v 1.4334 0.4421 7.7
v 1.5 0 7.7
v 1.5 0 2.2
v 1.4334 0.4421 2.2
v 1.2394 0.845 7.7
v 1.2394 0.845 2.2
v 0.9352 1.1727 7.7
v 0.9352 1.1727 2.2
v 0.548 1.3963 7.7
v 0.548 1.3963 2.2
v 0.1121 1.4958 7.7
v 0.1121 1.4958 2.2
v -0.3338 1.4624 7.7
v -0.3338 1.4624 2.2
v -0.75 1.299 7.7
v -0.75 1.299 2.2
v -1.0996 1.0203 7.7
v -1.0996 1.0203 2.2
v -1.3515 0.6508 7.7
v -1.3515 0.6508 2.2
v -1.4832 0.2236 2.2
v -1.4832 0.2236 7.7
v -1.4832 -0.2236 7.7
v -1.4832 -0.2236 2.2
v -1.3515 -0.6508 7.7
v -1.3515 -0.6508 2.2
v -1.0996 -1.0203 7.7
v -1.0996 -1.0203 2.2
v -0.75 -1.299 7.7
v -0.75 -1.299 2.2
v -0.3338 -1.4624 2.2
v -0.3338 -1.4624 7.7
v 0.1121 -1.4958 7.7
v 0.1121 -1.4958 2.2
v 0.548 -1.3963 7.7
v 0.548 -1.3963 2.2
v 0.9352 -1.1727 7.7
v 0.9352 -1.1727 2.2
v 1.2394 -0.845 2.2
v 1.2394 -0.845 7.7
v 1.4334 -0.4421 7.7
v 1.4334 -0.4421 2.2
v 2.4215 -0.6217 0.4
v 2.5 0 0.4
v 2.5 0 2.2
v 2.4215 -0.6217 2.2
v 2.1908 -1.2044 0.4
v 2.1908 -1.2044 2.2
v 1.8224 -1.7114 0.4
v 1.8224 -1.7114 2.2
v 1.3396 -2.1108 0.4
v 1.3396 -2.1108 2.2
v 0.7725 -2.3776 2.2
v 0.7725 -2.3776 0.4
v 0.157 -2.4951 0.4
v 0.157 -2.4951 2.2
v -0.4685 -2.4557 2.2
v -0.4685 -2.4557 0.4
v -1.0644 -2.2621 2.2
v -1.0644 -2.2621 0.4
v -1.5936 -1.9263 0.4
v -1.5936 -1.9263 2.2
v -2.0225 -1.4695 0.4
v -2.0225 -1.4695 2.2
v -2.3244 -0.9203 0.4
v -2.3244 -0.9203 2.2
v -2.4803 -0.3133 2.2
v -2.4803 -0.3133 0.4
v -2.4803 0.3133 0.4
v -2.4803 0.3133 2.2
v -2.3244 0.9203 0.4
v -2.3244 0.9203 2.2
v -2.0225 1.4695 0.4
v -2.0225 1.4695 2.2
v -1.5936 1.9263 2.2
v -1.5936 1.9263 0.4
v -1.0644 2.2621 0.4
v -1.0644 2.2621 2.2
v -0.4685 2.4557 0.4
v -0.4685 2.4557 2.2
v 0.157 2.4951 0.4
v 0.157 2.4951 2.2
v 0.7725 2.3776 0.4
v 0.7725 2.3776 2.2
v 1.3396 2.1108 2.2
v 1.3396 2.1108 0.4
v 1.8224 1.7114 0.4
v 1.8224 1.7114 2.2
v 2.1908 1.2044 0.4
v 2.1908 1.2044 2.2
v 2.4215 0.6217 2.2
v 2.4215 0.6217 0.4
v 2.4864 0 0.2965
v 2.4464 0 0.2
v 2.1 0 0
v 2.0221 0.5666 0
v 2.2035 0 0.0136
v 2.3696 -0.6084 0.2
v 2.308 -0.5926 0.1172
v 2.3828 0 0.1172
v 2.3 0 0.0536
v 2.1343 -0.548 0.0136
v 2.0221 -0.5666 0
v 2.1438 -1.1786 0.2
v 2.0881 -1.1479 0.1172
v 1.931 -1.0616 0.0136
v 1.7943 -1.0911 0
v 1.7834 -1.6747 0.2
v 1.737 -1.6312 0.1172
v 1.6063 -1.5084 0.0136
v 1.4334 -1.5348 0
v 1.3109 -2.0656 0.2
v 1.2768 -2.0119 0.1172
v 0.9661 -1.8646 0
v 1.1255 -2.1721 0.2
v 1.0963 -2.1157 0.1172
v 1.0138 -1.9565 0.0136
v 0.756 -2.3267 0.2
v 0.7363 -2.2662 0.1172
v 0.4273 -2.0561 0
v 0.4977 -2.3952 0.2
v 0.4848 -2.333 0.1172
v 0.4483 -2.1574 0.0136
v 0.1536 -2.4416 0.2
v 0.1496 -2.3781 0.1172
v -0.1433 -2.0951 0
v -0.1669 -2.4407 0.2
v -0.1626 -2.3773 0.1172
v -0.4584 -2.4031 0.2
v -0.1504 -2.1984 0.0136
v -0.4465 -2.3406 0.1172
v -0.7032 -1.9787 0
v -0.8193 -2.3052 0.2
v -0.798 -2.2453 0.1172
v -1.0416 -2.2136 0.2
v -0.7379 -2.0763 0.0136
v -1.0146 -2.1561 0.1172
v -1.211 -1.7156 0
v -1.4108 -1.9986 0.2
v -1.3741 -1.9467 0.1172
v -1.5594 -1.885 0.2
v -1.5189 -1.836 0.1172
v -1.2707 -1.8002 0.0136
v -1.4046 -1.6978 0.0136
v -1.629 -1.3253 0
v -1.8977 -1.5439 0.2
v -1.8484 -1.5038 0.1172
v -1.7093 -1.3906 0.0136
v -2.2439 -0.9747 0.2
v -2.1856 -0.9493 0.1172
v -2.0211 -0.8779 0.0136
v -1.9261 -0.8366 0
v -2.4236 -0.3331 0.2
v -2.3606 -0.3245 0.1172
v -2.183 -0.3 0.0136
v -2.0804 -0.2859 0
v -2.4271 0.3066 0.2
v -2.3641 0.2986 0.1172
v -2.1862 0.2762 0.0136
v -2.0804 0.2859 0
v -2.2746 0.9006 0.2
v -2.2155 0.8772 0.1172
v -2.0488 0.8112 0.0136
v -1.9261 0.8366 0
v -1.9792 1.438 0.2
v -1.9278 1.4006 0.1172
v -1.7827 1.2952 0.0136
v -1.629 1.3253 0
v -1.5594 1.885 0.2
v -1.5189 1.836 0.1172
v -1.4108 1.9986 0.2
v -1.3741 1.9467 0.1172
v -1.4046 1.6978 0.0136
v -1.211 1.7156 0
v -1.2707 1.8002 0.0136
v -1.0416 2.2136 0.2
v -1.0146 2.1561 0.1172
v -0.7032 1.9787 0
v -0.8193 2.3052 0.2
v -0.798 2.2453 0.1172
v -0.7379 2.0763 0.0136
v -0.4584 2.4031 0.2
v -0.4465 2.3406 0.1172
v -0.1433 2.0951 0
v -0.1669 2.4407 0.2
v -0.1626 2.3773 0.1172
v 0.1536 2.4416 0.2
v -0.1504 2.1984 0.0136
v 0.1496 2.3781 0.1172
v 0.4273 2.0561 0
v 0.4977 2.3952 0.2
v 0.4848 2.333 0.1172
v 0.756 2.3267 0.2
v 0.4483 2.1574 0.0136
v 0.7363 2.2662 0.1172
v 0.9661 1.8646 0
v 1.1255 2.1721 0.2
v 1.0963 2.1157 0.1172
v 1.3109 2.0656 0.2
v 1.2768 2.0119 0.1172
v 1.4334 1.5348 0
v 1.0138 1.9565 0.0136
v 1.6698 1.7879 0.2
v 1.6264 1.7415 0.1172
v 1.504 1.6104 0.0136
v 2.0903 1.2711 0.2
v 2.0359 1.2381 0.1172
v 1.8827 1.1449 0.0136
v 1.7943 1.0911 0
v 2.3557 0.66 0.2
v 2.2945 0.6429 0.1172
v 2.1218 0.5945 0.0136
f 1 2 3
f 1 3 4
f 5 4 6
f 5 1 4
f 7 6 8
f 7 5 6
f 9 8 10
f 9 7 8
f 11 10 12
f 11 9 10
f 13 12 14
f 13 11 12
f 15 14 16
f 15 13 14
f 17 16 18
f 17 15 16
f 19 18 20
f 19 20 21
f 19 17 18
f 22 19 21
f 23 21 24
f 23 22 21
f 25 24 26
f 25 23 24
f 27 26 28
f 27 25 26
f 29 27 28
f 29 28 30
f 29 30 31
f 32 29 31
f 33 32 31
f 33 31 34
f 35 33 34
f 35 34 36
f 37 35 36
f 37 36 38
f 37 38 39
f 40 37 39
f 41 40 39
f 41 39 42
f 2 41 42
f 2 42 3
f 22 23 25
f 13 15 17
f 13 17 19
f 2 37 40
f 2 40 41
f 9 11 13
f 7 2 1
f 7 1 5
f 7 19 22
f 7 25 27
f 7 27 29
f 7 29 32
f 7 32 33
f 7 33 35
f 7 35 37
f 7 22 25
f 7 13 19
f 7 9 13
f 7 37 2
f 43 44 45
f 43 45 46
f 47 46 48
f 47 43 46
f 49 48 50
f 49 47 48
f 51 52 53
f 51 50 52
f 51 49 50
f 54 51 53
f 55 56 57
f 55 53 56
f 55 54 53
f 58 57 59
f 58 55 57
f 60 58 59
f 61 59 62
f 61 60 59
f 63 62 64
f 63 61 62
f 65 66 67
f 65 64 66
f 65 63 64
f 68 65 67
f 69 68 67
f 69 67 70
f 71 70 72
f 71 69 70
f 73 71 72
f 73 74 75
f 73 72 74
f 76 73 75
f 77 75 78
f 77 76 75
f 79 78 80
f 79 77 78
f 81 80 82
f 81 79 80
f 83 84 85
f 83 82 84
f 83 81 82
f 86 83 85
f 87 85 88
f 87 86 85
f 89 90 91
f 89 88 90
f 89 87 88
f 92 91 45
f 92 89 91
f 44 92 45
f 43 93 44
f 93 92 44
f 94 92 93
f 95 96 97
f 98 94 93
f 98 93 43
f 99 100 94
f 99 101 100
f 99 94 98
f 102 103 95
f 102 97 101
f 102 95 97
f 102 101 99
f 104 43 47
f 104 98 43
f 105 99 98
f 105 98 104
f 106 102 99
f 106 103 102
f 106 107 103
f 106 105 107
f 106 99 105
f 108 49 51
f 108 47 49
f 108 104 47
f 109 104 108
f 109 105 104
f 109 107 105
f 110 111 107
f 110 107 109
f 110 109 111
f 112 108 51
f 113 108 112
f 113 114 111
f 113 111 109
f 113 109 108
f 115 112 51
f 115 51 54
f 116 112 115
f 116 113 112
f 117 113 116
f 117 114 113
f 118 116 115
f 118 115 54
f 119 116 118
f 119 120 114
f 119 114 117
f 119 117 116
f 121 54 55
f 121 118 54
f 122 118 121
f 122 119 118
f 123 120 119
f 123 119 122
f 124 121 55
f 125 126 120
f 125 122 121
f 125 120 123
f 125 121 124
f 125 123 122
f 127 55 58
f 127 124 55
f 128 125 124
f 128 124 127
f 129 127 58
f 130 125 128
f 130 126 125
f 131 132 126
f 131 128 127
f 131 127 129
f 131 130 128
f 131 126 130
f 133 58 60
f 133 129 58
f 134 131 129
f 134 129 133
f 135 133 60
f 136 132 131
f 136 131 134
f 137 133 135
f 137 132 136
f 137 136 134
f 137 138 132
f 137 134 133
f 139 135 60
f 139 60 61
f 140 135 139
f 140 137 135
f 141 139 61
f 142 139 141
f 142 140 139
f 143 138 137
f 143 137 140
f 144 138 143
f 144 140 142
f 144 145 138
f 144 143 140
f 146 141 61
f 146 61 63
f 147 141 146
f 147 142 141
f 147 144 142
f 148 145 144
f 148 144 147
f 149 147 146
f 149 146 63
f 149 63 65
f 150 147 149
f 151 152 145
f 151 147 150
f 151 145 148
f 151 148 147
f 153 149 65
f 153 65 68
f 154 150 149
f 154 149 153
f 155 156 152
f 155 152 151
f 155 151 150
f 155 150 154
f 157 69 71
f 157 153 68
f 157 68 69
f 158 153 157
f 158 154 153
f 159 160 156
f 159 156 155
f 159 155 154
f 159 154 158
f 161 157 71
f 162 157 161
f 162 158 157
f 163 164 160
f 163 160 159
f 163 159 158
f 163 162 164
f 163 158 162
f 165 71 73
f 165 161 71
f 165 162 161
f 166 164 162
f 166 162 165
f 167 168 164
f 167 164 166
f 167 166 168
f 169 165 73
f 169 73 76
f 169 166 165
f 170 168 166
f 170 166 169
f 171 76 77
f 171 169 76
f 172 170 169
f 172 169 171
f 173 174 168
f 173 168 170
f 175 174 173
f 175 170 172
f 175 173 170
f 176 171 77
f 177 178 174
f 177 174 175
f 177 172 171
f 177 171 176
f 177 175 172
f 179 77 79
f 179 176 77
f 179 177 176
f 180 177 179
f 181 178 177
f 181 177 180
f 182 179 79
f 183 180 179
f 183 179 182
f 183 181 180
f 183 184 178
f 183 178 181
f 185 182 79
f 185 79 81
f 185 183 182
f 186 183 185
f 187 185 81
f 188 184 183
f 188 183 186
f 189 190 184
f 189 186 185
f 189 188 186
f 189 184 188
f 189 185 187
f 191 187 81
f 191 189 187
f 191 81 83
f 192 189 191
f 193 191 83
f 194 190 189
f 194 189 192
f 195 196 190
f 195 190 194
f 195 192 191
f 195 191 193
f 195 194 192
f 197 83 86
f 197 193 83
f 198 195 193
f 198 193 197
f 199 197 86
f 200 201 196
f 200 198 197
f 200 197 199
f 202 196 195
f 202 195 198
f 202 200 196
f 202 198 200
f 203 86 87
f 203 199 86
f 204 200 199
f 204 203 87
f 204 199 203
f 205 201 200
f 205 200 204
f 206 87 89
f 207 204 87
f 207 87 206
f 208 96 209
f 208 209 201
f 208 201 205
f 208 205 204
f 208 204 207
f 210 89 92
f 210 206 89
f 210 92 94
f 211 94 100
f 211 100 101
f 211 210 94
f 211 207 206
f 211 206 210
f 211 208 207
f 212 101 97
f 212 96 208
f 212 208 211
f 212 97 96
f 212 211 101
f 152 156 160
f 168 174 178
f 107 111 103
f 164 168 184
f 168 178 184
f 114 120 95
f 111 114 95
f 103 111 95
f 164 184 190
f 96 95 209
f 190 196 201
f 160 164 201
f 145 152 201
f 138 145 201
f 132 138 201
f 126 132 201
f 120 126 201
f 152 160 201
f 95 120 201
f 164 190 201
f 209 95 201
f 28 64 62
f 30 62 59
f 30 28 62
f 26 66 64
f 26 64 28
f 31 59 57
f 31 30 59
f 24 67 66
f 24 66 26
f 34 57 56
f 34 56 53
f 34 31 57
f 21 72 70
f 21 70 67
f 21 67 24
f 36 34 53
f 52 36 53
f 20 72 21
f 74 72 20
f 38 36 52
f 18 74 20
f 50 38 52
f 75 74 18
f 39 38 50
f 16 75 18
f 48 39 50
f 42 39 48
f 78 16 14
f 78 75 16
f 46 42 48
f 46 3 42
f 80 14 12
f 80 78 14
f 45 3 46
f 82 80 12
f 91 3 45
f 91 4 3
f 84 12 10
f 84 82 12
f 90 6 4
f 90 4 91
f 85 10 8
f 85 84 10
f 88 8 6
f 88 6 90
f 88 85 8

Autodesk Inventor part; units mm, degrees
ref_plane "YZ Plane" through (0, 0, 0) normal (1, 0, 0) x (0, 1, 0)
ref_plane "XZ Plane" through (0, 0, 0) normal (0, 1, 0) x (-1, 0, 0)
ref_plane "XY Plane" through (0, 0, 0) normal (0, 0, 1) x (1, 0, 0)
sketch "Sketch1" plane through (0, 0, 0) normal (0, 0, 1) x (1, 0, 0)
  circle A0 centre (0, 0) radius 2.5
  dimension "d0" = 5
extrude "Extrusion1" add sketch "Sketch1" along normal blind 7.7
sketch "Sketch2" plane through (0, 0, 7.7) normal (0, 0, 1) x (1, 0, 0)
  circle A0 centre (0, 0) radius 1.5
  circle A1 centre (0, 0) radius 2.5
  dimension "d3" = 3
extrude "Extrusion2" cut sketch "Sketch2" against normal blind 5.5
fillet "Fillet1" radius 0.4 1 edges at (-2.5, 0, 0)
properties part number "MachineScrew3mm"
